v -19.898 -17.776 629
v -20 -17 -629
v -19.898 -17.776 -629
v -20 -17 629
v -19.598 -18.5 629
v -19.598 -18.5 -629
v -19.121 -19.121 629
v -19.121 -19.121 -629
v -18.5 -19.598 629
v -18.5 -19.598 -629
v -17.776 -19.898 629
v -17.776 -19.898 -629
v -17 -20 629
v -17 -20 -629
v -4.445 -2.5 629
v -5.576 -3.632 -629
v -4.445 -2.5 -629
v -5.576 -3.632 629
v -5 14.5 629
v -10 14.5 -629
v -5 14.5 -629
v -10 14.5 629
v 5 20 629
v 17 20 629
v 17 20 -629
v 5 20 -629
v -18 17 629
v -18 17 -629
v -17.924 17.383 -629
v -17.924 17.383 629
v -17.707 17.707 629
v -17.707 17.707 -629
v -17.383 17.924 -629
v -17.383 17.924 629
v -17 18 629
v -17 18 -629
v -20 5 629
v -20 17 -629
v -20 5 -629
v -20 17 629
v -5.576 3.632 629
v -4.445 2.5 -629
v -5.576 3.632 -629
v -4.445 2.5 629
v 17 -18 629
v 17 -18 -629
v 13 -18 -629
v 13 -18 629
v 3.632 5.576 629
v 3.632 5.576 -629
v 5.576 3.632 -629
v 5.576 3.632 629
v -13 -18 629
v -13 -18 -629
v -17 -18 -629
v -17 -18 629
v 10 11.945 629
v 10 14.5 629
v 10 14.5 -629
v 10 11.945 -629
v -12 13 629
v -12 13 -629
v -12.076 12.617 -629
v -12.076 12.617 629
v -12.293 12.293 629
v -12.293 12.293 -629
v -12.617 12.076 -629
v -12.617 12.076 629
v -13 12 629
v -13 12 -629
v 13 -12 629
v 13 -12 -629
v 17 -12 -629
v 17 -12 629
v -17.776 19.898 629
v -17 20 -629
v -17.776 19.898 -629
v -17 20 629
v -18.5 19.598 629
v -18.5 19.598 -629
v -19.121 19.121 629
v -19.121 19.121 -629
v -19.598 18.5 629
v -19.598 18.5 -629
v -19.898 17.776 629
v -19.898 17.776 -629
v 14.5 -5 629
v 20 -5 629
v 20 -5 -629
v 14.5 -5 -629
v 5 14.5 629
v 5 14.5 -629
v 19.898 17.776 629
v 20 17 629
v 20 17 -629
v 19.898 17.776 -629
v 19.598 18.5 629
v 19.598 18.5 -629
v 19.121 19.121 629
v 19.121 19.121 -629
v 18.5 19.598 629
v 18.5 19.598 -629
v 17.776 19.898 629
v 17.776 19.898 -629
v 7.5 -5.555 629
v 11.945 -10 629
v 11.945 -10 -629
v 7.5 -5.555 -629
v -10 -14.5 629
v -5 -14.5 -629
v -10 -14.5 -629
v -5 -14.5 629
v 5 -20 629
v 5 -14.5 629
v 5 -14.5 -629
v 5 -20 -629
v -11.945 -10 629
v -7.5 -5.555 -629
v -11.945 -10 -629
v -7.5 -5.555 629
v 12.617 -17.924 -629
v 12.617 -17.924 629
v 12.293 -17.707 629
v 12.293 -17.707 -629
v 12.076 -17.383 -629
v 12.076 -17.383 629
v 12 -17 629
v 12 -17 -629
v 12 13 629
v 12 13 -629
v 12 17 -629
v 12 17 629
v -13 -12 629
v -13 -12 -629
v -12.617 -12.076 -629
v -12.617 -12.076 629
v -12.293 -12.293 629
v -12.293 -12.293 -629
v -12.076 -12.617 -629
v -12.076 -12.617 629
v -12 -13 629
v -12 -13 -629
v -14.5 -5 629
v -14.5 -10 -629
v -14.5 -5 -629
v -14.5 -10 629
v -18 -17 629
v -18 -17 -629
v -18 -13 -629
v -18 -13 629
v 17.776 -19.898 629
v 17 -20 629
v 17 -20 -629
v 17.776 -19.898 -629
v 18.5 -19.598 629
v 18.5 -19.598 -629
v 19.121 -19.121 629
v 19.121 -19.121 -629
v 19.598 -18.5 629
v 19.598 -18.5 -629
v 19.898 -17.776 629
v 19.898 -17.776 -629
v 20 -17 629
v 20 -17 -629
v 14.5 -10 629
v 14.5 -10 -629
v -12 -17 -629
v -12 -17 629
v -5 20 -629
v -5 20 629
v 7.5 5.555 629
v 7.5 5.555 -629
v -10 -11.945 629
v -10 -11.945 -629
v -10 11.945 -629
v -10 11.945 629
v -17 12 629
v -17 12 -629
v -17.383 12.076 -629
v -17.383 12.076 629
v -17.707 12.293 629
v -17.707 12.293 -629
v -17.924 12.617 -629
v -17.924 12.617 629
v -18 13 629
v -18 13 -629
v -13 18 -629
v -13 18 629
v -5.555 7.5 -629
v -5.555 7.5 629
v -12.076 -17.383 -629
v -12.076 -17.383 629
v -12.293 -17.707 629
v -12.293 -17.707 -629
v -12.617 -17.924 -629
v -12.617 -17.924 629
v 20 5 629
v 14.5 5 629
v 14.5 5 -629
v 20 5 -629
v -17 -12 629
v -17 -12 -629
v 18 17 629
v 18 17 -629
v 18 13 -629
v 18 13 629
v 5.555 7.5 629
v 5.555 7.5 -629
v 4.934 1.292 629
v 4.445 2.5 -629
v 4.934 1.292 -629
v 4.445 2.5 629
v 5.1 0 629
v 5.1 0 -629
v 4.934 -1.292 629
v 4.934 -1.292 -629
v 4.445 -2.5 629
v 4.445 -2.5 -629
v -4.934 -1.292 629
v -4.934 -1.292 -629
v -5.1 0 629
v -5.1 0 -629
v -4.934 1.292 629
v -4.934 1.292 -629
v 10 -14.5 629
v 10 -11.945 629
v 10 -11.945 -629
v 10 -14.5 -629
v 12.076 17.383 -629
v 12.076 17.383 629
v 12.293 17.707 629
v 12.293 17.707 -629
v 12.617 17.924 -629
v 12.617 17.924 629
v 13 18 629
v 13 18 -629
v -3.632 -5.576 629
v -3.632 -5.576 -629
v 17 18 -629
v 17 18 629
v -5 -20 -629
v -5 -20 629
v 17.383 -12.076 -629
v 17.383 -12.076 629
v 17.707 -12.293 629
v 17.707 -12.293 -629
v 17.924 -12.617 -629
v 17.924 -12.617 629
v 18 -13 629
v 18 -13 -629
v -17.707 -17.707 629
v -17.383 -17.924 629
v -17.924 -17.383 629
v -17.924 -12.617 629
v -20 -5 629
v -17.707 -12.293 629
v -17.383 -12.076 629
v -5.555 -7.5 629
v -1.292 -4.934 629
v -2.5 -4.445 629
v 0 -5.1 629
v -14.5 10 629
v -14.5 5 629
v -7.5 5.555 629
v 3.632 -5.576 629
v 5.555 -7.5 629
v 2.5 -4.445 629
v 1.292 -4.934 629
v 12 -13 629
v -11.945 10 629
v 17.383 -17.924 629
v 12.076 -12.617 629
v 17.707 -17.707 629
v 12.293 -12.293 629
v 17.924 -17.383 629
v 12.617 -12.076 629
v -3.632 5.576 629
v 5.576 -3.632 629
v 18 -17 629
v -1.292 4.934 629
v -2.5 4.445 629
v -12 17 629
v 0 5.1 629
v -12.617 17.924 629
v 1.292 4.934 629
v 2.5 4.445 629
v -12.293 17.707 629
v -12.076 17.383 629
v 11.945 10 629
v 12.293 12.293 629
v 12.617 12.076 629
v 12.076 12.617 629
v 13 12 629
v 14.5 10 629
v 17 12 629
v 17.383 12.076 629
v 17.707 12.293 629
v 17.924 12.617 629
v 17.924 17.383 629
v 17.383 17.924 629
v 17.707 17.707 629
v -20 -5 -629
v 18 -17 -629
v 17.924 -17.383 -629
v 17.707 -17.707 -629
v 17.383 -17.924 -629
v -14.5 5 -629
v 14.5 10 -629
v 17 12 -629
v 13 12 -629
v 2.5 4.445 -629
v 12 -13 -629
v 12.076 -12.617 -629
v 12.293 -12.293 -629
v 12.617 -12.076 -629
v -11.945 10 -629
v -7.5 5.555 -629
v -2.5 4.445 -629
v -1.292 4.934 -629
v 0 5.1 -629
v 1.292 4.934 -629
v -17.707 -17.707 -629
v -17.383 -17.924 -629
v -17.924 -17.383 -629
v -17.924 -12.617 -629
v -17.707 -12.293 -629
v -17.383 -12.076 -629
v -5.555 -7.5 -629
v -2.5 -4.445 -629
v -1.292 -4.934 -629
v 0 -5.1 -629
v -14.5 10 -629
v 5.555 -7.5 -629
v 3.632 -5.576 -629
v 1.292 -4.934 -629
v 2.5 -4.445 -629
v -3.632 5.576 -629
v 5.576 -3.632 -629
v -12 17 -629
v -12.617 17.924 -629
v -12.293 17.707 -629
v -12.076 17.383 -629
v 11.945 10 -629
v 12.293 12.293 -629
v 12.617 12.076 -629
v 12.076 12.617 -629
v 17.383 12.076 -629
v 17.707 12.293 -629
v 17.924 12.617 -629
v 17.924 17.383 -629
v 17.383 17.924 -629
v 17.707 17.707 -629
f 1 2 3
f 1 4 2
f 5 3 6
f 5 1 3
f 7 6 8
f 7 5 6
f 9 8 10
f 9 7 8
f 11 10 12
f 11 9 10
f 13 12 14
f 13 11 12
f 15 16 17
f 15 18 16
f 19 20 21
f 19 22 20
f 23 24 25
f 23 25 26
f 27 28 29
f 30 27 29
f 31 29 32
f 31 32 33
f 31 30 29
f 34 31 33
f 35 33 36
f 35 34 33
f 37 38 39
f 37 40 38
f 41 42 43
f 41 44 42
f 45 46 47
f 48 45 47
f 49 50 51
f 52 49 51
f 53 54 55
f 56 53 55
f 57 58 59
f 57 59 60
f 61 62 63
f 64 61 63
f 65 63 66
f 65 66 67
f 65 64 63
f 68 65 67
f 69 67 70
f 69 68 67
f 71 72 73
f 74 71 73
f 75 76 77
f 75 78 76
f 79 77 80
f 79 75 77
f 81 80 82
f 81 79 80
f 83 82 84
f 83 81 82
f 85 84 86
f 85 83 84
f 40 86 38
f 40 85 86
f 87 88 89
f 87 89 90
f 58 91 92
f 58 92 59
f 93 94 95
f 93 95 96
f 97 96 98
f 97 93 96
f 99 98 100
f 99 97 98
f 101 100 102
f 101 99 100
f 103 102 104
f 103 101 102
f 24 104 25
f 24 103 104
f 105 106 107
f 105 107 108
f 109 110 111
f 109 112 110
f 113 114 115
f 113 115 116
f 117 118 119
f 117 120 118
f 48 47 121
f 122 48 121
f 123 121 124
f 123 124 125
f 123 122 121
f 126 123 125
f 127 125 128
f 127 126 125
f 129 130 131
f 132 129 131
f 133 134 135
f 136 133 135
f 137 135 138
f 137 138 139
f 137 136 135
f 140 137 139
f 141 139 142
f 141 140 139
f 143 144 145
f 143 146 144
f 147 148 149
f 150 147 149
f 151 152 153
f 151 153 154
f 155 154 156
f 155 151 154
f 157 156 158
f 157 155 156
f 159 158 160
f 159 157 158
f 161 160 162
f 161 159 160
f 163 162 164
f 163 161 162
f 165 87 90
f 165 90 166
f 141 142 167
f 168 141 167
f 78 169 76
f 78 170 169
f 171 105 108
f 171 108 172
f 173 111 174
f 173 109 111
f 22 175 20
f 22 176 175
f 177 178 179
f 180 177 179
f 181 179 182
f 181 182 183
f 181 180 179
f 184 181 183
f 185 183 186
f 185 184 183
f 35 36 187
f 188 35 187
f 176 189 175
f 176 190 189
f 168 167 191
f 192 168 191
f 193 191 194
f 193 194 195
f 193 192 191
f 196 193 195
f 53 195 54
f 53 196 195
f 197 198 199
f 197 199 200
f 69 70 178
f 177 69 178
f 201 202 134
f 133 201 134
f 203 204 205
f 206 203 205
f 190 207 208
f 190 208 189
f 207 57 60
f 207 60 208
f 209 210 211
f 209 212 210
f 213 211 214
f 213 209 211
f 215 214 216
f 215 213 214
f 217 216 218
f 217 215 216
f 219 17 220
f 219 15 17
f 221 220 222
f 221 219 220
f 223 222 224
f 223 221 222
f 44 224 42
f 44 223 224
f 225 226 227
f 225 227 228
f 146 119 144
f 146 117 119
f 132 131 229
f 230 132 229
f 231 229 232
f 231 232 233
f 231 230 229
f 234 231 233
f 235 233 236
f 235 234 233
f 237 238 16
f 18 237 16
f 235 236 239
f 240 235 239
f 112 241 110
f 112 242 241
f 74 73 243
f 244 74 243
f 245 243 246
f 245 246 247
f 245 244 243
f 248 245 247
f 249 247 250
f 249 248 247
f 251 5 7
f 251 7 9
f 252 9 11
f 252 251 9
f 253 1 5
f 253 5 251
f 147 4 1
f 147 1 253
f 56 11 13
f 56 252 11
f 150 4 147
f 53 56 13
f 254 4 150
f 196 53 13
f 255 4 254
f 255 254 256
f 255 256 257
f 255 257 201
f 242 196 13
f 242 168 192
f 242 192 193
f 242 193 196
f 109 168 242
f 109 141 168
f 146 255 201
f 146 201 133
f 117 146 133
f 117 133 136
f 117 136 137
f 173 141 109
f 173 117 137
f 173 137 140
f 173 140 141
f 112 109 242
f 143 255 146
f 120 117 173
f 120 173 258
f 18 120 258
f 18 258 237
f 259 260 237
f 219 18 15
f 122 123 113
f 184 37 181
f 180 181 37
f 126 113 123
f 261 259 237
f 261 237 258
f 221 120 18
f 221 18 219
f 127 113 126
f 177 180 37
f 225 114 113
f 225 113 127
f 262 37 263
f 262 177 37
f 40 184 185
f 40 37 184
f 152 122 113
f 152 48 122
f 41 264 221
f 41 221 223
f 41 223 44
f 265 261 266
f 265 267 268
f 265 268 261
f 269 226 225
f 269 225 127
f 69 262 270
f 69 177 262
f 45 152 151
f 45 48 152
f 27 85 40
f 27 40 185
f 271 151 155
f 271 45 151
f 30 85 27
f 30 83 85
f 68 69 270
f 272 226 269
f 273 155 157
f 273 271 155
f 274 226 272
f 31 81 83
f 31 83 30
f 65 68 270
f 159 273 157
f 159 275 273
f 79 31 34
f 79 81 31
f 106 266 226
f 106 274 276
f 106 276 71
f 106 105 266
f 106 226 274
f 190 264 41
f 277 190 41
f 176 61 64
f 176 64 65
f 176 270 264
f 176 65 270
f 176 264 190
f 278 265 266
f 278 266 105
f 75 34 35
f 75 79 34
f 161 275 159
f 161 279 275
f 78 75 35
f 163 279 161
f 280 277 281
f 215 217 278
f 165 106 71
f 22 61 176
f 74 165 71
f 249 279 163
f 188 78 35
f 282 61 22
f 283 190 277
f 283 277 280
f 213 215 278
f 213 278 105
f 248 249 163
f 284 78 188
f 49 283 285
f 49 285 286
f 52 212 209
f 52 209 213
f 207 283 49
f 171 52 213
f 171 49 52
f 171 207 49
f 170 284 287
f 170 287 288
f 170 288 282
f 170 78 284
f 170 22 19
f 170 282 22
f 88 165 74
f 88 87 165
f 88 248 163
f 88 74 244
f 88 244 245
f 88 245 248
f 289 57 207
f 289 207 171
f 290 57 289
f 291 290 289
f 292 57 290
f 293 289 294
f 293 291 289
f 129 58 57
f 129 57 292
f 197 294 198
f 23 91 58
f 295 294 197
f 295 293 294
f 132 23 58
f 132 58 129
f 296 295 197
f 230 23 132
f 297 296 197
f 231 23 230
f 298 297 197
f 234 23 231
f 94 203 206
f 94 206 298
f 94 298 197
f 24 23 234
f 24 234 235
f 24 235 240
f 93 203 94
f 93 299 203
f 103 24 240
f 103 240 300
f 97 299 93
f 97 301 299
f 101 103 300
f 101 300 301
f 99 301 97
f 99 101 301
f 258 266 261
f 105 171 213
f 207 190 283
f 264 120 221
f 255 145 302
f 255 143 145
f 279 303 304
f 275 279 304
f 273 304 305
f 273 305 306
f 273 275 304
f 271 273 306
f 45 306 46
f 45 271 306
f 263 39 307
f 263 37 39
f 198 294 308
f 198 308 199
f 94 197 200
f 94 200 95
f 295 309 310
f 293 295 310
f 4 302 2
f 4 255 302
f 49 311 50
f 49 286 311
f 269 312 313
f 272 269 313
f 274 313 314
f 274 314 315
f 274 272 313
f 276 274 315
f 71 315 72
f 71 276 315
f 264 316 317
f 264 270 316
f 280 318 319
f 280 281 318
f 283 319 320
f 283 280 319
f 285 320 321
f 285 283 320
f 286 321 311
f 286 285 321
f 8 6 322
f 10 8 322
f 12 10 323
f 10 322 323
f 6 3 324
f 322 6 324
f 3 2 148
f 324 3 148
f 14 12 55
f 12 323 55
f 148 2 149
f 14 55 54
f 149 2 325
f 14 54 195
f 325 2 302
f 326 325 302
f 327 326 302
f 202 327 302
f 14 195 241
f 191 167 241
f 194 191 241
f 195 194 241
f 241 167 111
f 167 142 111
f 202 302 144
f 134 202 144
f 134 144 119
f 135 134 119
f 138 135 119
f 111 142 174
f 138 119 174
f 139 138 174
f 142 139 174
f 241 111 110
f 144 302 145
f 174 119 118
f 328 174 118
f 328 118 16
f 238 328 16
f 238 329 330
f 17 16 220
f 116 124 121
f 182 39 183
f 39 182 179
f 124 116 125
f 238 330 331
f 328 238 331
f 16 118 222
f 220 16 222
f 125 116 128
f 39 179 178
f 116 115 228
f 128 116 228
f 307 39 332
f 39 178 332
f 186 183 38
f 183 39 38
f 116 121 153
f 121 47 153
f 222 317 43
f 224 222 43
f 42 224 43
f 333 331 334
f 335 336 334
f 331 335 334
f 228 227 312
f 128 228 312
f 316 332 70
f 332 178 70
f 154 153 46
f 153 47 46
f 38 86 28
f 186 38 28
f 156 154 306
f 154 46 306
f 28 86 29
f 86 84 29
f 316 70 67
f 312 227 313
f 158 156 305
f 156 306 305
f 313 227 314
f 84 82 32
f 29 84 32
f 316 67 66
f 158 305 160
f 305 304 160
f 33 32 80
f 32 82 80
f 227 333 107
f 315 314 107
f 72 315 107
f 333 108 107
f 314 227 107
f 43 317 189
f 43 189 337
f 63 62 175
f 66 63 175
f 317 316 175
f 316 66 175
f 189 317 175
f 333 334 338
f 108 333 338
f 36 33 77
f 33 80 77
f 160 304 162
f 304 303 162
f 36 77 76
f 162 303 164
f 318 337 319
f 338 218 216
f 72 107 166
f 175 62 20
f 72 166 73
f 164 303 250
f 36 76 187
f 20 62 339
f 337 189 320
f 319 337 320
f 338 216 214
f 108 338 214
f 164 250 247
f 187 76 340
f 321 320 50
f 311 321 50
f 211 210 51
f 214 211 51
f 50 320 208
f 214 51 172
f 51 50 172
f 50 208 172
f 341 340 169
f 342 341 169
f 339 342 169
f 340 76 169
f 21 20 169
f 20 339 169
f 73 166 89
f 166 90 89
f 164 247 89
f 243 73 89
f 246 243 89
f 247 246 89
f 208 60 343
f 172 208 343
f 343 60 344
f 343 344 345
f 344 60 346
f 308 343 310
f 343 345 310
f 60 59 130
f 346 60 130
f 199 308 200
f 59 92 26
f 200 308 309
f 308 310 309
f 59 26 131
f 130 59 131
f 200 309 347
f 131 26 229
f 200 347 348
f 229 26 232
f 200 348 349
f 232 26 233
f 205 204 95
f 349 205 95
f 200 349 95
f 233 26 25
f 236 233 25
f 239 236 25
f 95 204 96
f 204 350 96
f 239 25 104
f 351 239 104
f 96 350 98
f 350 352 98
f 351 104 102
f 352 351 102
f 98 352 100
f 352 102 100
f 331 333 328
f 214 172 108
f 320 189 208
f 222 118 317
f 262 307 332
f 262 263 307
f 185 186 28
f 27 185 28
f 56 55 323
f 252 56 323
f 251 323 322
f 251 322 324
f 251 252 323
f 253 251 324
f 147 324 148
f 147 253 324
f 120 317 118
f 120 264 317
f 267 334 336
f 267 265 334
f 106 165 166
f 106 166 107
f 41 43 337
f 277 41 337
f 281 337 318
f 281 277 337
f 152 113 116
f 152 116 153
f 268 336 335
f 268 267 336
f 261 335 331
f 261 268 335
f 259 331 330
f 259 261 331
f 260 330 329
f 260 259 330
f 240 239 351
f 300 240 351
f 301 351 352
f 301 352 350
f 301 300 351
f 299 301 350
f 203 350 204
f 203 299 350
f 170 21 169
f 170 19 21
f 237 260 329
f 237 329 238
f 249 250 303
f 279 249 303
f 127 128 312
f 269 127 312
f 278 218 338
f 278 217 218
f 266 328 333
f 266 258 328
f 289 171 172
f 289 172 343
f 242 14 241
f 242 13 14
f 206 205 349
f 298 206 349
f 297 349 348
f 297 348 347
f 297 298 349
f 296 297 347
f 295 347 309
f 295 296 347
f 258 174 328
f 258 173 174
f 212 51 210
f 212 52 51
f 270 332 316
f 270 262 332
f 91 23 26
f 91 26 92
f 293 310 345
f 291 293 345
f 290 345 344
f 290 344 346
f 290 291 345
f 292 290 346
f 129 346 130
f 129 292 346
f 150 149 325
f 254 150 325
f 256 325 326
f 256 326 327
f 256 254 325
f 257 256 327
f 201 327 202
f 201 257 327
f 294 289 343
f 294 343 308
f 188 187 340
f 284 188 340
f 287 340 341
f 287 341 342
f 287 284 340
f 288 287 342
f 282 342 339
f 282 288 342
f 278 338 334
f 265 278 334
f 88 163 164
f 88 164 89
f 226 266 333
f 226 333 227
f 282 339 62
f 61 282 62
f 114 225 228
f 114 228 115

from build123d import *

# Parameters (mm, degrees)
BOSS_EXTRUDE1_DEPTH = 629


with BuildPart() as part:
    # Sketch1 → Boss-Extrude1 (new, symmetric)
    with BuildSketch(Plane.XY):
        with BuildLine():
            Line((-5.555456352, -7.5), (5.555456352, -7.5))
            Line((5.555456352, -7.5), (10, -11.944543648))
            Line((10, -11.944543648), (10, -14.5))
            Line((10, -14.5), (5, -14.5))
            Line((5, -14.5), (5, -20))
            Line((5, -20), (17, -20))
            ThreePointArc((17, -20), (19.121320344, -19.121320344), (20, -17))
            Line((20, -17), (20, -5))
            Line((20, -5), (14.5, -5))
            Line((14.5, -5), (14.5, -10))
            Line((14.5, -10), (11.944543648, -10))
            Line((11.944543648, -10), (7.5, -5.555456352))
            Line((7.5, -5.555456352), (7.5, 5.555456352))
            Line((7.5, 5.555456352), (11.944543648, 10))
            Line((11.944543648, 10), (14.5, 10))
            Line((14.5, 10), (14.5, 5))
            Line((14.5, 5), (20, 5))
            Line((20, 5), (20, 17))
            ThreePointArc((20, 17), (19.121320344, 19.121320344), (17, 20))
            Line((17, 20), (5, 20))
            Line((5, 20), (5, 14.5))
            Line((5, 14.5), (10, 14.5))
            Line((10, 14.5), (10, 11.944543648))
            Line((10, 11.944543648), (5.555456352, 7.5))
            Line((5.555456352, 7.5), (-5.555456352, 7.5))
            Line((-5.555456352, 7.5), (-10, 11.944543648))
            Line((-10, 11.944543648), (-10, 14.5))
            Line((-10, 14.5), (-5, 14.5))
            Line((-5, 14.5), (-5, 20))
            Line((-5, 20), (-17, 20))
            ThreePointArc((-17, 20), (-19.121320344, 19.121320344), (-20, 17))
            Line((-20, 17), (-20, 5))
            Line((-20, 5), (-14.5, 5))
            Line((-14.5, 5), (-14.5, 10))
            Line((-14.5, 10), (-11.944543648, 10))
            Line((-11.944543648, 10), (-7.5, 5.555456352))
            Line((-7.5, 5.555456352), (-7.5, -5.555456352))
            Line((-7.5, -5.555456352), (-11.944543648, -10))
            Line((-11.944543648, -10), (-14.5, -10))
            Line((-14.5, -10), (-14.5, -5))
            Line((-14.5, -5), (-20, -5))
            Line((-20, -5), (-20, -17))
            ThreePointArc((-20, -17), (-19.121320344, -19.121320344), (-17, -20))
            Line((-17, -20), (-5, -20))
            Line((-5, -20), (-5, -14.5))
            Line((-5, -14.5), (-10, -14.5))
            Line((-10, -14.5), (-10, -11.944543648))
            Line((-10, -11.944543648), (-5.555456352, -7.5))
        make_face()
        with BuildLine():
            Line((-18, 13), (-18, 17))
            ThreePointArc((-18, 17), (-17.707106781, 17.707106781), (-17, 18))
            Line((-17, 18), (-13, 18))
            ThreePointArc((-13, 18), (-12.292893219, 17.707106781), (-12, 17))
            Line((-12, 17), (-12, 13))
            ThreePointArc((-12, 13), (-12.292893219, 12.292893219), (-13, 12))
            Line((-13, 12), (-17, 12))
            ThreePointArc((-17, 12), (-17.707106781, 12.292893219), (-18, 13))
        make_face(mode=Mode.SUBTRACT)
        with BuildLine():
            Line((-18, -17), (-18, -13))
            ThreePointArc((-18, -13), (-17.707106781, -12.292893219), (-17, -12))
            Line((-17, -12), (-13, -12))
            ThreePointArc((-13, -12), (-12.292893219, -12.292893219), (-12, -13))
            Line((-12, -13), (-12, -17))
            ThreePointArc((-12, -17), (-12.292893219, -17.707106781), (-13, -18))
            Line((-13, -18), (-17, -18))
            ThreePointArc((-17, -18), (-17.707106781, -17.707106781), (-18, -17))
        make_face(mode=Mode.SUBTRACT)
        with BuildLine():
            Line((18, -13), (18, -17))
            ThreePointArc((18, -17), (17.707106781, -17.707106781), (17, -18))
            Line((17, -18), (13, -18))
            ThreePointArc((13, -18), (12.292893219, -17.707106781), (12, -17))
            Line((12, -17), (12, -13))
            ThreePointArc((12, -13), (12.292893219, -12.292893219), (13, -12))
            Line((13, -12), (17, -12))
            ThreePointArc((17, -12), (17.707106781, -12.292893219), (18, -13))
        make_face(mode=Mode.SUBTRACT)
        with BuildLine():
            Line((18, 17), (18, 13))
            ThreePointArc((18, 13), (17.707106781, 12.292893219), (17, 12))
            Line((17, 12), (13, 12))
            ThreePointArc((13, 12), (12.292893219, 12.292893219), (12, 13))
            Line((12, 13), (12, 17))
            ThreePointArc((12, 17), (12.292893219, 17.707106781), (13, 18))
            Line((13, 18), (17, 18))
            ThreePointArc((17, 18), (17.707106781, 17.707106781), (18, 17))
        make_face(mode=Mode.SUBTRACT)
        with BuildLine():
            Line((-2.500434253, -4.444977902), (-3.631805103, -5.576348751))
            Line((-3.631805103, -5.576348751), (-5.576348751, -3.631805103))
            Line((-5.576348751, -3.631805103), (-4.444977902, -2.500434253))
            ThreePointArc((-4.444977902, -2.500434253), (-5.1, 0), (-4.444977902, 2.500434253))
            Line((-4.444977902, 2.500434253), (-5.576348751, 3.631805103))
            Line((-5.576348751, 3.631805103), (-3.631805103, 5.576348751))
            Line((-3.631805103, 5.576348751), (-2.500434253, 4.444977902))
            ThreePointArc((-2.500434253, 4.444977902), (0, 5.1), (2.500434253, 4.444977902))
            Line((2.500434253, 4.444977902), (3.631805103, 5.576348751))
            Line((3.631805103, 5.576348751), (5.576348751, 3.631805103))
            Line((5.576348751, 3.631805103), (4.444977902, 2.500434253))
            ThreePointArc((4.444977902, 2.500434253), (5.1, 0), (4.444977902, -2.500434253))
            Line((4.444977902, -2.500434253), (5.576348751, -3.631805103))
            Line((5.576348751, -3.631805103), (3.631805103, -5.576348751))
            Line((3.631805103, -5.576348751), (2.500434253, -4.444977902))
            ThreePointArc((2.500434253, -4.444977902), (0, -5.1), (-2.500434253, -4.444977902))
        make_face(mode=Mode.SUBTRACT)
    extrude(amount=BOSS_EXTRUDE1_DEPTH, both=True)


solid = part.part
